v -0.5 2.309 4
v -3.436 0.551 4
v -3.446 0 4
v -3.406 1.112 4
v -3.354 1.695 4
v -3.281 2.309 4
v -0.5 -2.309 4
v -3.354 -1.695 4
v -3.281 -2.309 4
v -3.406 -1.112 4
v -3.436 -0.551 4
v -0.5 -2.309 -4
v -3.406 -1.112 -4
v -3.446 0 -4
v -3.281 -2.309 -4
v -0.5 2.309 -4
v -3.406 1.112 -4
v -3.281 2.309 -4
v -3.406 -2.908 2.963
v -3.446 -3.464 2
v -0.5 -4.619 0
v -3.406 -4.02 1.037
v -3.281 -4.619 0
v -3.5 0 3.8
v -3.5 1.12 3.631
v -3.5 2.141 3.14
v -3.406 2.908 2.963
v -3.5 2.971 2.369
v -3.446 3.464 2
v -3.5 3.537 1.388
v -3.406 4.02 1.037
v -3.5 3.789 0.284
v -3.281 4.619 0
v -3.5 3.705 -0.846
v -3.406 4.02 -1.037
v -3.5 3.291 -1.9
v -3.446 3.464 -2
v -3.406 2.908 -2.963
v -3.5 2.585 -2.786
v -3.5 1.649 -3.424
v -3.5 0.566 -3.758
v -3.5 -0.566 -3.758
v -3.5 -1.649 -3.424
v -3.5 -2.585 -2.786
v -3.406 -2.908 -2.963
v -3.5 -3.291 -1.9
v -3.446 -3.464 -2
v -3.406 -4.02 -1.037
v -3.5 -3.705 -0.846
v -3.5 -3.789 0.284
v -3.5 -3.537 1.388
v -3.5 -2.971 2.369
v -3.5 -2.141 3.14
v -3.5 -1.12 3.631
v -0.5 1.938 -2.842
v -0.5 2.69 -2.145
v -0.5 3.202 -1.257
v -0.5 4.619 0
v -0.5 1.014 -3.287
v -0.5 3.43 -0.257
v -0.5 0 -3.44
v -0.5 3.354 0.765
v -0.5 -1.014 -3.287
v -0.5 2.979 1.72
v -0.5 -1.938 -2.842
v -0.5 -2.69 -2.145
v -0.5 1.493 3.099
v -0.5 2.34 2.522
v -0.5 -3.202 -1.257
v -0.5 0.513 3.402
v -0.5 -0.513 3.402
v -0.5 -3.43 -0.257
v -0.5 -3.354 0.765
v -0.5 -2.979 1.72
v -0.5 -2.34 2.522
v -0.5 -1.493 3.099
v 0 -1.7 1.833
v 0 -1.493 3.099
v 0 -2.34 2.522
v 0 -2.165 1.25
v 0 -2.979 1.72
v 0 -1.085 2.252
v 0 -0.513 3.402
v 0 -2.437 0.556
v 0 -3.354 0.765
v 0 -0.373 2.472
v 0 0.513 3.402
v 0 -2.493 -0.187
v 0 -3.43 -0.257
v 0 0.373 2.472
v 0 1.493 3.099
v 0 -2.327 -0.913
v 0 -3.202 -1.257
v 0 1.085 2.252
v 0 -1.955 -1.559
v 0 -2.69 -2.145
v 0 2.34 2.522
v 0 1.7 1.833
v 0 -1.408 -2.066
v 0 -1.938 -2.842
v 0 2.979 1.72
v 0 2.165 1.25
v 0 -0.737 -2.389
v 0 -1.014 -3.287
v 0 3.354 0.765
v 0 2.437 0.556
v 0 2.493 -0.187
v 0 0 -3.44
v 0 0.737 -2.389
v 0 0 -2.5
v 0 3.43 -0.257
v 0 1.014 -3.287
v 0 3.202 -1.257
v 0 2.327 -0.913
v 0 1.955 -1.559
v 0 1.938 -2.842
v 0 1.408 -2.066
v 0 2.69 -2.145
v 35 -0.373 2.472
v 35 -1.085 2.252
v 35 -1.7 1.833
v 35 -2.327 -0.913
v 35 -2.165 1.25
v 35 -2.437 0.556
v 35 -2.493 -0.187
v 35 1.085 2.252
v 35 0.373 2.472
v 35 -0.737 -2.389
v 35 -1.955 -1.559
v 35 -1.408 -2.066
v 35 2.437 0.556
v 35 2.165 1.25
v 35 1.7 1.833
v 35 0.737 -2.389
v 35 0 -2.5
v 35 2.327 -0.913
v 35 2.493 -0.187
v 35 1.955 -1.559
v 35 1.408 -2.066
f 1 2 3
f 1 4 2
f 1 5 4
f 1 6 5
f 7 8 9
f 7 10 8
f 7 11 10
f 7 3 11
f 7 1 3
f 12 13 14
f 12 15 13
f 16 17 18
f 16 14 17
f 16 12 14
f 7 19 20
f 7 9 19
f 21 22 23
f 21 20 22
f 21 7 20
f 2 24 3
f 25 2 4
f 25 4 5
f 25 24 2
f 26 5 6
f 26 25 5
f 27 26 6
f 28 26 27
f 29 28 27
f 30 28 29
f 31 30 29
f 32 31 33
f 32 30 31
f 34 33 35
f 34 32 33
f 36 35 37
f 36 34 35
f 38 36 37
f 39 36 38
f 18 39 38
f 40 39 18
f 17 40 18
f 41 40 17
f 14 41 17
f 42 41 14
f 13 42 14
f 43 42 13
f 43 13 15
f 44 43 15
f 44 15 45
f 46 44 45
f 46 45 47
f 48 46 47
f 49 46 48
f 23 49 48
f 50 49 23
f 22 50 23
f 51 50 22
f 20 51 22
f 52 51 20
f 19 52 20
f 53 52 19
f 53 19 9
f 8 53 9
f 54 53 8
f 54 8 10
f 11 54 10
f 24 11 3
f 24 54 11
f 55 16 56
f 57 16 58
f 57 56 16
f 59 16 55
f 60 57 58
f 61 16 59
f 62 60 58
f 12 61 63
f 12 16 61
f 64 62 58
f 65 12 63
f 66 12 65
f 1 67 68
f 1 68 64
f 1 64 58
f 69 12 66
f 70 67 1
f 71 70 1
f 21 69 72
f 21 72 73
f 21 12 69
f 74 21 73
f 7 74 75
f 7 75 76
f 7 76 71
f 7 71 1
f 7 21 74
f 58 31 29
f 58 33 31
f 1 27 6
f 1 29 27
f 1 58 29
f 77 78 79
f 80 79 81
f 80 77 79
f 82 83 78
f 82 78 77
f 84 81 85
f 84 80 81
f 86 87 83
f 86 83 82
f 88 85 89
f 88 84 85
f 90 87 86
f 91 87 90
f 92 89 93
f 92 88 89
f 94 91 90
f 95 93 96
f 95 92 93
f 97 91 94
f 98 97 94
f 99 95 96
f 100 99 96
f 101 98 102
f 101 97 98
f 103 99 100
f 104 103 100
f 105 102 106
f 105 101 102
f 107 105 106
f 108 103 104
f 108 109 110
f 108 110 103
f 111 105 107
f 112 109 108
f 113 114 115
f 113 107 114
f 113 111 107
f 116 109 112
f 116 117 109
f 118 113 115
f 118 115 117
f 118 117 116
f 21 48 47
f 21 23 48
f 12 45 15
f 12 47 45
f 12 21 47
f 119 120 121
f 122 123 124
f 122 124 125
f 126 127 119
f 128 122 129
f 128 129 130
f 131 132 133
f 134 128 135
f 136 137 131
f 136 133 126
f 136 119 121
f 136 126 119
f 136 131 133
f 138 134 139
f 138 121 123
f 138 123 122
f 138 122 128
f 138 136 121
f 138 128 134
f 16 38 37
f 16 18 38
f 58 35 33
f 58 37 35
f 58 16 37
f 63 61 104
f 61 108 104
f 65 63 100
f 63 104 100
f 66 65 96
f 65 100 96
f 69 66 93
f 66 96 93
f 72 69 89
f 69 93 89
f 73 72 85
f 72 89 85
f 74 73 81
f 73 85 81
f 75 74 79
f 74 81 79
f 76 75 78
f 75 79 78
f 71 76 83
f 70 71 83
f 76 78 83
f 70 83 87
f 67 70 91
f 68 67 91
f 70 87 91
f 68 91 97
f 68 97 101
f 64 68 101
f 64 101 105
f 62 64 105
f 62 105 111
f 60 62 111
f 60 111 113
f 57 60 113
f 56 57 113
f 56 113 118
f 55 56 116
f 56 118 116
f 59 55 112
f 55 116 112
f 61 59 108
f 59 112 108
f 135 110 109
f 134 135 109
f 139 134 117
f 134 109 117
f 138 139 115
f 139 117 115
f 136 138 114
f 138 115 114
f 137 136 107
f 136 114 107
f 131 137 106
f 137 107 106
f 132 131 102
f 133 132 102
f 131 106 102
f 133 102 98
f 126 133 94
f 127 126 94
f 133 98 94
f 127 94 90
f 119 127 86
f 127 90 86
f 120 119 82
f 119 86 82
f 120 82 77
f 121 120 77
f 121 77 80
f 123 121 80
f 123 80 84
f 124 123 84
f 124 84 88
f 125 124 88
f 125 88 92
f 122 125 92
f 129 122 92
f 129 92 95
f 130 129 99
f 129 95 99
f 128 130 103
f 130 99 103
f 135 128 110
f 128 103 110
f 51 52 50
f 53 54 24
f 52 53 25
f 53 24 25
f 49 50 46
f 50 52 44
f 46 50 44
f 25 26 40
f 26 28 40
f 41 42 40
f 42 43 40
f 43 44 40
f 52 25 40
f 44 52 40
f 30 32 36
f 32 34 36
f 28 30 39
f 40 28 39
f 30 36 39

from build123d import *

# Parameters (mm, degrees)
HEAD_DEPTH        = 3.5
SK2_W             = 0.5
SK2_H             = 1.178802154
SK3_R             = 2.5
BODY_DEPTH        = 35
SK5_OUTSIDE_W     = 316.508
SK5_OUTSIDE_H     = 317.746
SK5_OUTSIDE_R     = 3.8
HEADCHAMFER_DEPTH = 39.981833376
HEADCHAMFER_DRAFT = -75


with BuildPart() as part:
    # Sk1 → Head (new body)
    with BuildSketch(Plane(origin=(0, 0, 0), x_dir=(0, 0, -1), z_dir=(1, 0, 0))):
        Polygon((0, 4.618802154), (-4, 2.309401077), (-4, -2.309401077), (0, -4.618802154), (4, -2.309401077), (4, 2.309401077), align=None)
    extrude(amount=-HEAD_DEPTH)

    # Sk2 → UNHead (revolve, cut)
    with BuildSketch(Plane.XY, mode=Mode.PRIVATE) as unhead_sk:
        with Locations((-0.25, 4.029401077)):
            Rectangle(SK2_W, SK2_H)
    revolve(unhead_sk.sketch.rotate(Axis((0, 0, 0), (-1, 0, 0)), 90), axis=Axis((0, 0, 0), (-1, 0, 0)), mode=Mode.SUBTRACT)

    # Sk3 → Body (add)
    with BuildSketch(Plane(origin=(0, 0, 0), x_dir=(0, 0, -1), z_dir=(1, 0, 0))):
        Circle(SK3_R)
    extrude(amount=BODY_DEPTH)


with BuildPart() as headchamfer_tool:
    # Sk5 outside → HeadChamfer (with draft: the straight prism first)
    with BuildSketch(Plane.ZY.offset(3.5)):
        Rectangle(SK5_OUTSIDE_W, SK5_OUTSIDE_H)
        Circle(SK5_OUTSIDE_R, mode=Mode.SUBTRACT)
    extrude(amount=-HEADCHAMFER_DEPTH)
    # HeadChamfer: the draft: its side faces are tilted about the plane it starts from
    headchamfer_sides = [headchamfer_tool.faces().sort_by_distance(p)[0] for p in [
        (16.490916688, -158.873, 0),
        (16.490916688, 0, 158.254),
        (16.490916688, 158.873, 0),
        (16.490916688, 0, -158.254),
        (16.490916688, 0, -3.8),
    ]]
    draft(headchamfer_sides, Plane.ZY.offset(3.5), HEADCHAMFER_DRAFT)


with BuildPart() as part_1:
    add(part.part)

    # HeadChamfer: cut by headchamfer_tool
    add(headchamfer_tool.part, mode=Mode.SUBTRACT)


solid = part_1.part
